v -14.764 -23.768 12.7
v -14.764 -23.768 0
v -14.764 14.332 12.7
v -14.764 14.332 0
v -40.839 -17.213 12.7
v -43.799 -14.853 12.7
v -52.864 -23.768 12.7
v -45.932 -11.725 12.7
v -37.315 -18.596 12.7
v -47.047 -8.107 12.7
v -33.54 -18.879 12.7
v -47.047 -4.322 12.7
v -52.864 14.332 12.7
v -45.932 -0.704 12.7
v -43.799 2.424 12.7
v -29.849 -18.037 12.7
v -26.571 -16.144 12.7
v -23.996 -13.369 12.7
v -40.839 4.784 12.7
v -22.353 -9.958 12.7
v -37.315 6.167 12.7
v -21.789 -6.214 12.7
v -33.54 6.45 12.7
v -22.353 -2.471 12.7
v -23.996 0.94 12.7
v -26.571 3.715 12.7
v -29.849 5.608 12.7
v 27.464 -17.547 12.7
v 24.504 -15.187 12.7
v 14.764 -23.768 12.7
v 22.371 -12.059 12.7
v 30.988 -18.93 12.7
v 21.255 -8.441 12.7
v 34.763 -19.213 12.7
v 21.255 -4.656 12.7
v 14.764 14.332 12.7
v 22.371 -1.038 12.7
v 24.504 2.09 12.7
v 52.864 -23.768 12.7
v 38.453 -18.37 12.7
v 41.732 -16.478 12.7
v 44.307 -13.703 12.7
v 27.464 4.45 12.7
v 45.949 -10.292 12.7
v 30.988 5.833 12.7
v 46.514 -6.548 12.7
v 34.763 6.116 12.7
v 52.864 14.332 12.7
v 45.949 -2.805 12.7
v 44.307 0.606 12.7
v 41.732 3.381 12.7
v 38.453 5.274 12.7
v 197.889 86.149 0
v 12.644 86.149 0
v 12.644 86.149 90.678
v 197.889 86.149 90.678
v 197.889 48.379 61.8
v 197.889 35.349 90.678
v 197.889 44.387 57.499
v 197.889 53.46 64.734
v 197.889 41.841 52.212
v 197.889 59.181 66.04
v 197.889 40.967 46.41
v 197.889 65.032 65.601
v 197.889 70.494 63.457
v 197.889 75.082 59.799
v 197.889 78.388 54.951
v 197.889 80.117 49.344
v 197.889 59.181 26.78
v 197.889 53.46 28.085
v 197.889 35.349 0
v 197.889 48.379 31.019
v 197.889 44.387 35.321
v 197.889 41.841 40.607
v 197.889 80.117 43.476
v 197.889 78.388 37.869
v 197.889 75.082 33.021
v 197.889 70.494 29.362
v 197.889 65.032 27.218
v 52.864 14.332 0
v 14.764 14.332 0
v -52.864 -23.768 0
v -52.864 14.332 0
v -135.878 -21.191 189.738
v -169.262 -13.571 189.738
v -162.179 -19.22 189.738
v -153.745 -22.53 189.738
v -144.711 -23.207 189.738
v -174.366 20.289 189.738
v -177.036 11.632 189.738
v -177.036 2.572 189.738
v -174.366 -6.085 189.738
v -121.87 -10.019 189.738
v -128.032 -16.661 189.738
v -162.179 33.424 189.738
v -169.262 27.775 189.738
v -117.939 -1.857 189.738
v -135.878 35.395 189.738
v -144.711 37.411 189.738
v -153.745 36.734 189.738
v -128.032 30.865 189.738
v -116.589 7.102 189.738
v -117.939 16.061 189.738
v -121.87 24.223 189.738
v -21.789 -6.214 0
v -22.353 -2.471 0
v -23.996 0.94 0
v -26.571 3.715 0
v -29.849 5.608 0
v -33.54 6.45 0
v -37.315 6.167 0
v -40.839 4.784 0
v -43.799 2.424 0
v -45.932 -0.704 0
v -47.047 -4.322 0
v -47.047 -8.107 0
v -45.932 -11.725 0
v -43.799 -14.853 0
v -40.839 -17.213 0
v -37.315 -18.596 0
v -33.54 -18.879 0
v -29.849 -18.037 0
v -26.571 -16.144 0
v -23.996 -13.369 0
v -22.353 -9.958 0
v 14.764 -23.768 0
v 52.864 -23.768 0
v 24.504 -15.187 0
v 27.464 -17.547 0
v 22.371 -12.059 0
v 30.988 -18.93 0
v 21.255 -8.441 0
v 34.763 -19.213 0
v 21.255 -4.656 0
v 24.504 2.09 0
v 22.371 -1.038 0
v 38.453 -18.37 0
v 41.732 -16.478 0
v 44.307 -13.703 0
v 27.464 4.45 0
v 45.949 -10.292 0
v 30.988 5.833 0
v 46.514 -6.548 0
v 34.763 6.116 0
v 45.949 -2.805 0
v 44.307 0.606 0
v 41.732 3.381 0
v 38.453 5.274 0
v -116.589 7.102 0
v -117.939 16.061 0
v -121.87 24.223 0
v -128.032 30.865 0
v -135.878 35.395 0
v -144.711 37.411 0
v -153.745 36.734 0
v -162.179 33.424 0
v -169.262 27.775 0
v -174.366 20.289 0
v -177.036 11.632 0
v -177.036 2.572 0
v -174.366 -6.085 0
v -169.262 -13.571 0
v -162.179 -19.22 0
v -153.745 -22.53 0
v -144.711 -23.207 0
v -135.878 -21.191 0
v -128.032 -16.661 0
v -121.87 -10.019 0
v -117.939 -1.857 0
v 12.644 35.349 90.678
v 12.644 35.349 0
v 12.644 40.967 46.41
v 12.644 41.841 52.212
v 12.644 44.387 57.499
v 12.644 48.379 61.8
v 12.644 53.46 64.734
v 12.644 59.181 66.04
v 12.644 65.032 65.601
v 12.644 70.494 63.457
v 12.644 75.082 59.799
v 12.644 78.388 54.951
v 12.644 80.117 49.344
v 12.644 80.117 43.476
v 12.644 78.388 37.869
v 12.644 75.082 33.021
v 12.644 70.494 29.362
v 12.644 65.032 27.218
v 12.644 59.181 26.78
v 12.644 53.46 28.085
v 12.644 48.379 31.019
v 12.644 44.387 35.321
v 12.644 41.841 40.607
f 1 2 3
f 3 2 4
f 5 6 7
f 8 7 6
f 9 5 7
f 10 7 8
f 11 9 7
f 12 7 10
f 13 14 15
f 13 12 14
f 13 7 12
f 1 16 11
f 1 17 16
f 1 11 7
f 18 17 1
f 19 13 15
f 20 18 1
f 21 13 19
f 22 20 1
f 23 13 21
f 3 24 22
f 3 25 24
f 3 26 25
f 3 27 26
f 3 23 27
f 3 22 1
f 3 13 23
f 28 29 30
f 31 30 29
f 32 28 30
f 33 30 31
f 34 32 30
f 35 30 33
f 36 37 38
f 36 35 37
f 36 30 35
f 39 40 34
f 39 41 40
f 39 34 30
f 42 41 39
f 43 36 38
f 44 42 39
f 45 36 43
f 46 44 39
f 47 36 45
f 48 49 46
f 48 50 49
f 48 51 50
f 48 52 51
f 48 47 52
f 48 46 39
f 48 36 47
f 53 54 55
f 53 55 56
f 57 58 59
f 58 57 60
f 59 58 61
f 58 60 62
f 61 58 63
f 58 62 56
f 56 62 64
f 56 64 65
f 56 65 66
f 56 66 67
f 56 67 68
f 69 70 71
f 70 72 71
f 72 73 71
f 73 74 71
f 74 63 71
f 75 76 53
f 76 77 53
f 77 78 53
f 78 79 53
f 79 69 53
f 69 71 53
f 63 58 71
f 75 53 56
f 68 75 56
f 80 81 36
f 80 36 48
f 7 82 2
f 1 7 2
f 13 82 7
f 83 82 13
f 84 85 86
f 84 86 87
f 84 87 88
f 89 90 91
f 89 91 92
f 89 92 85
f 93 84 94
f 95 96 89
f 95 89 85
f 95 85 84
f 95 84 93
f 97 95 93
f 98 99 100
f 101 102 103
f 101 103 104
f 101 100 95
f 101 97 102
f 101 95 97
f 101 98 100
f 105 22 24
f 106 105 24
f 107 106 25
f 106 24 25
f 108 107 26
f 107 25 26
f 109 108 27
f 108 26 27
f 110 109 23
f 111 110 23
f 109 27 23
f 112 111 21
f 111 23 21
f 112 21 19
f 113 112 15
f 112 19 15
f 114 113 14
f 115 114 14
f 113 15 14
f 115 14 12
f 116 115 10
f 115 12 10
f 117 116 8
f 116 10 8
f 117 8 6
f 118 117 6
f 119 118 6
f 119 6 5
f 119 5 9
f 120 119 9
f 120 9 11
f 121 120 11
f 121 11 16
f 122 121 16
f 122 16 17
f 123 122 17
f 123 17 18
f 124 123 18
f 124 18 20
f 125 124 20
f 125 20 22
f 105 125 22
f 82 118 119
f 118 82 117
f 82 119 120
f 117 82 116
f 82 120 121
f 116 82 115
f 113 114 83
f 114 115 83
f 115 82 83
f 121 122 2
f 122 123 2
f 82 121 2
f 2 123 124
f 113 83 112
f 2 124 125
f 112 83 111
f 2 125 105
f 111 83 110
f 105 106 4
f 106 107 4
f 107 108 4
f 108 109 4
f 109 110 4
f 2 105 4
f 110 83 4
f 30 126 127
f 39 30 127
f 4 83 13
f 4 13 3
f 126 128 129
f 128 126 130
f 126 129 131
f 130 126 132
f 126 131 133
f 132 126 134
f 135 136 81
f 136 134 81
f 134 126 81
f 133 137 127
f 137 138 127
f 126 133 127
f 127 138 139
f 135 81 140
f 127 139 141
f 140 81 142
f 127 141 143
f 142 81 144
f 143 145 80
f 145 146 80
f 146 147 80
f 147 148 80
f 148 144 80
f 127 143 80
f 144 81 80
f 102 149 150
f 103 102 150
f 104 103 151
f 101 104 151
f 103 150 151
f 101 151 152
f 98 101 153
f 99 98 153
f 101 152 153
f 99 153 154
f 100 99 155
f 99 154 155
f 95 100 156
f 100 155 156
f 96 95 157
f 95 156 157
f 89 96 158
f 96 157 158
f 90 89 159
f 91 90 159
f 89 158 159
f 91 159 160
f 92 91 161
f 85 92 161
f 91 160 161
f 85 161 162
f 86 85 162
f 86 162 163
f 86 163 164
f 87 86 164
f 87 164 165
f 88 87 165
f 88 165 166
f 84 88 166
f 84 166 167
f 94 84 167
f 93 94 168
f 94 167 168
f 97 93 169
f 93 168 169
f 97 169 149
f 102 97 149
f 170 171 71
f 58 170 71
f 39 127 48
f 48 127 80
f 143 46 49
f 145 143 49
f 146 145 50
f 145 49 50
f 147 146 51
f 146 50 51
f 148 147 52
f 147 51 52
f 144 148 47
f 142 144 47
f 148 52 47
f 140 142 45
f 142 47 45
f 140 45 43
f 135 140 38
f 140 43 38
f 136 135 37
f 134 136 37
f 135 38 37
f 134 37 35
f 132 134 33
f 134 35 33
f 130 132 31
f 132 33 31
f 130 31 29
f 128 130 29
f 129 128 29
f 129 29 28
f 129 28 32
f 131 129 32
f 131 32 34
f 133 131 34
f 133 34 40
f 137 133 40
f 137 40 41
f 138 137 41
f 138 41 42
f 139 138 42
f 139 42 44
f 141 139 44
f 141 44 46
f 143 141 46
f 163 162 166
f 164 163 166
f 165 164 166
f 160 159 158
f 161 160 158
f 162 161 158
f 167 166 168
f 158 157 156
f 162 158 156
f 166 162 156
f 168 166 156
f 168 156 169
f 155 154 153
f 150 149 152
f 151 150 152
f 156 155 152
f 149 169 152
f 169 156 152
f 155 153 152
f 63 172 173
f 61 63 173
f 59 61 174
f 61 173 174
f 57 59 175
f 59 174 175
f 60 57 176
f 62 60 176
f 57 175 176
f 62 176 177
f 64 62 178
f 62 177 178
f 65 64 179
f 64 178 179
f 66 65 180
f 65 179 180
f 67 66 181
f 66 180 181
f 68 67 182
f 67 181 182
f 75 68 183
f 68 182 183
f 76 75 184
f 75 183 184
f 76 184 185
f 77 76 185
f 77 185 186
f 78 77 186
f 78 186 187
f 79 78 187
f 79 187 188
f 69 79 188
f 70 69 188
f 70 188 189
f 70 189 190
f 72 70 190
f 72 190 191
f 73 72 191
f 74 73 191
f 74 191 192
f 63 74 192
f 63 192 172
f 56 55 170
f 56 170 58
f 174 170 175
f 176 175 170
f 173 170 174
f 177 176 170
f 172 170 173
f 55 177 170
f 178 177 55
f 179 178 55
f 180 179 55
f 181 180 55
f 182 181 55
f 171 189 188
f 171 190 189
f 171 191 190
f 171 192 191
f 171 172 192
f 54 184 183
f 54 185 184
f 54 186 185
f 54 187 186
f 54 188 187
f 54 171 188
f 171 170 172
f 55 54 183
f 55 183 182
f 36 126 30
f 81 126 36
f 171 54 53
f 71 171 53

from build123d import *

# Parameters (mm, degrees)
F0_R      = 30.3936981342
F1_DEPTH  = 90.678
F0_W      = 185.2448705491
F0_H      = 50.8
F2_R      = 19.685
F3_DEPTH  = 254
F4_DEPTH  = 72.644
F5_DEPTH  = 163.449
F6_DEPTH  = 189.738
F7_W      = 38.1
F7_H      = 38.1
F8_DEPTH  = 12.7
F9_R      = 12.7
F11_DEPTH = 25.4
F10_R     = 12.7
F12_DEPTH = 25.4


with BuildPart() as f1:
    # F0 (on Top) → F1 (new body)
    with BuildSketch(Plane.XY):
        with Locations((-146.9822469854, 7.1020000799)):
            Circle(F0_R)
    extrude(amount=F1_DEPTH)

    # F4 (add): a face of the model
    f4_faces = [f1.faces().sort_by_distance(p)[0] for p in [
        (-146.9822469854, 7.1020000799, 90.678),
    ]]
    extrude(f4_faces, amount=F4_DEPTH)

    # F5 (cut): a face of the model
    f5_faces = [f1.faces().sort_by_distance(p)[0] for p in [
        (-146.9822469854, 7.1020000799, 163.322),
    ]]
    extrude(f5_faces, amount=-F5_DEPTH, mode=Mode.SUBTRACT)


with BuildPart() as f1b:
    # F0 (on Top) → F1, piece 2 (new body)
    with BuildSketch(Plane.XY):
        with Locations((105.2660896319, 60.7485641011)):
            Rectangle(F0_W, F0_H)
    extrude(amount=F1_DEPTH)

    # F2 (on face) → F3 (cut)
    with BuildSketch(Plane(origin=(12.6436543573, 0, 0), x_dir=(0, -1, 0), z_dir=(-1, 0, 0))):
        with Locations((-60.6519393623, 46.409741044)):
            Circle(F2_R)
    extrude(amount=-F3_DEPTH, mode=Mode.SUBTRACT)


with BuildPart() as f6:
    # F0 (on Top) → F6 (new body)
    with BuildSketch(Plane.XY):
        with Locations((-146.9822469854, 7.1020000799)):
            Circle(F0_R)
    extrude(amount=F6_DEPTH)


with BuildPart() as f8:
    # F7 (on Top) → F8 (new body)
    with BuildSketch(Plane.XY):
        with Locations((-33.8135628553, -4.7180391848)):
            Rectangle(F7_W, F7_H)
    extrude(amount=F8_DEPTH)

    # F9 (on face) → F11 (cut)
    with BuildSketch(Plane.XY.offset(12.7)):
        with Locations((-34.4892255962, -6.2144650146)):
            Circle(F9_R)
    extrude(amount=-F11_DEPTH, mode=Mode.SUBTRACT)


with BuildPart() as f8b:
    # F7 (on Top) → F8, piece 2 (new body)
    with BuildSketch(Plane.XY):
        with Locations((33.8135628553, -4.7180391848)):
            Rectangle(F7_W, F7_H)
    extrude(amount=F8_DEPTH)

    # F10 (on face) → F12 (cut)
    with BuildSketch(Plane.XY.offset(12.7)):
        with Locations((33.8135628553, -6.5483846702)):
            Circle(F10_R)
    extrude(amount=-F12_DEPTH, mode=Mode.SUBTRACT)


solid = Compound([f1b.part, f6.part, f8.part, f8b.part])
